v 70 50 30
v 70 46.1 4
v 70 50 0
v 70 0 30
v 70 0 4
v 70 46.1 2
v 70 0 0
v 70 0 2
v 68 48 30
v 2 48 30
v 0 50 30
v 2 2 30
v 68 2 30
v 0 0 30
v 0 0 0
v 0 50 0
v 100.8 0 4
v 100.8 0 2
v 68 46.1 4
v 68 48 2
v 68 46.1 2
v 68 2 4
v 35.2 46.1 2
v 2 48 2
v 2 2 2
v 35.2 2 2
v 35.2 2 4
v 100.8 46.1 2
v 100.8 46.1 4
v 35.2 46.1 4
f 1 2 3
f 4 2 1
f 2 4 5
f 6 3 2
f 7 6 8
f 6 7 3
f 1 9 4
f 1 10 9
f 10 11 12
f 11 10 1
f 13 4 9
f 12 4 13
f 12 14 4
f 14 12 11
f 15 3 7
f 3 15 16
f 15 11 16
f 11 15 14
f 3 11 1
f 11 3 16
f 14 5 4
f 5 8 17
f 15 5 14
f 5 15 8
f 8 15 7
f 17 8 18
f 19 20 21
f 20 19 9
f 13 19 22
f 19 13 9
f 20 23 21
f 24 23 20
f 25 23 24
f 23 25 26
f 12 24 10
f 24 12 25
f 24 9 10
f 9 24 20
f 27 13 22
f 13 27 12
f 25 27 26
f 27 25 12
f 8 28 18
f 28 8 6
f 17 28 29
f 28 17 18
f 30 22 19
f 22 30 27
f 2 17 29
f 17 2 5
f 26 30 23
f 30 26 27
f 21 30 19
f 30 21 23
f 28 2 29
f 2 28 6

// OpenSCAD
// Two-part enclosure for small electronics board (e.g., Arduino-based logger)
// Print orientation: both parts on the bed (z = 0), lid on the +X side,
// with a 10 mm gap between them. The lid is printed upside down so its lip
// hangs into the box opening.

// ---------------- Parameters ----------------
box_x      = 70;    // box outer size in X (mm)
box_y      = 50;    // box outer size in Y (mm)
box_z      = 30;    // box outer size in Z (mm)
box_wall   = 2;     // box wall thickness (mm)
box_floor  = 2;     // box floor thickness (mm)

lip_w      = 65.6;  // lid lip outer size in X (mm)
lip_d      = 45.6;  // lid lip outer size in Y (mm)
lip_h      = 4;     // lid lip height above plate (mm)
lip_t      = 1.5;   // lid lip wall thickness (mm)

plate_t    = 2;     // lid plate thickness (mm)

gap        = 10;    // gap between box and lid (mm)

eps        = 0.5;   // overshoot for clean boolean cuts (mm)

$fn = 64;           // curve resolution (no curved features here)

// Derived
lip_y0     = box_y + gap;   // lip bottom edge in Y
lip_x0     = box_x / 2 - (lip_w - box_x + 2 * box_wall) / 2;  // lip left edge in X

// ---------------- Modules ----------------
module box() {
    // Open-top box: solid outer block with a hollow interior.
    // The top face at z = box_z - box_wall is not cut; it stays solid.
    difference() {
        translate([0, 0, 0])
            cube([box_x, box_y, box_z]);
        translate([box_wall, box_wall, box_floor])
            cube([box_x - 2 * box_wall,
                  box_y - 2 * box_wall,
                  box_z - box_floor]);
    }
}

module lid() {
    // Base plate lying on the bed
    translate([0, 0, 0])
        cube([box_x, box_y, plate_t]);

    // Rectangular lip on top of the plate. Its thickness (1.5 mm) is added
    // upward from the plate top, and it extends eps past the plate edges
    // so the union is one solid block with no coplanar faces.
    translate([lip_x0, 0, plate_t])
        cube([lip_w, lip_d + eps, lip_t + eps]);
}

// ---------------- Assembly ----------------
box();        // Part 1: the open-top box
translate([0, 0, 0])
    lid();     // Part 2: the upside-down lid, printed on the +X side
